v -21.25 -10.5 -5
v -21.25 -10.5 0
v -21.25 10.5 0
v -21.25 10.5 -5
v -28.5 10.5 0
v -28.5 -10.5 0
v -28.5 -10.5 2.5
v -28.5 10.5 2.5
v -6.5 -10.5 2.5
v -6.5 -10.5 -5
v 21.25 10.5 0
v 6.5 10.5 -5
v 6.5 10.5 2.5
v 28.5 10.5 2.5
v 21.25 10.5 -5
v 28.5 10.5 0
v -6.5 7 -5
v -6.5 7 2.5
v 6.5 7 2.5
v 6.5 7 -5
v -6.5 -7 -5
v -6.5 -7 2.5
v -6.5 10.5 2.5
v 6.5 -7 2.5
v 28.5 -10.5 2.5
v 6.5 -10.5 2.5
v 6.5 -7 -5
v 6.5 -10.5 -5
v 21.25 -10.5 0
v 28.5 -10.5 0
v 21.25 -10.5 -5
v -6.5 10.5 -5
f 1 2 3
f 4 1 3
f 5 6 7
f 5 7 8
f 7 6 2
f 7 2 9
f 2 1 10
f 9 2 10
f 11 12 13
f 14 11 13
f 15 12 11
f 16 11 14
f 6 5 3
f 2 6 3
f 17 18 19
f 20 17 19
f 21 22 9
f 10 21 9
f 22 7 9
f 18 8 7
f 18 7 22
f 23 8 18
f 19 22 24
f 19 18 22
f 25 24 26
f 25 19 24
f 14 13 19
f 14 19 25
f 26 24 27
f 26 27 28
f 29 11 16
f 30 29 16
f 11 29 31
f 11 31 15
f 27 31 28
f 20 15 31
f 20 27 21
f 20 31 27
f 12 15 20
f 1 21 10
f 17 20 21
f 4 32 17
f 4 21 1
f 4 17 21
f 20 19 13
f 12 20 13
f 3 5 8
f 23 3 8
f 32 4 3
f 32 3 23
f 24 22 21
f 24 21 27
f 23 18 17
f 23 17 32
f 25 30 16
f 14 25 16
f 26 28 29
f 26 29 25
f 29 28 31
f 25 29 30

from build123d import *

# Parameters (mm, degrees)
SKETCH1_W           = 57
SKETCH1_H           = 21
BOSS_EXTRUDE1_DEPTH = 2.5
SKETCH2_W           = 42.5
SKETCH2_H           = 21
BOSS_EXTRUDE2_DEPTH = 5
SKETCH3_W           = 13
SKETCH3_H           = 3.5
CUT_EXTRUDE1_DEPTH  = 8.5


with BuildPart() as part:
    # Sketch1 → Boss-Extrude1 (new body)
    with BuildSketch(Plane.XY):
        Rectangle(SKETCH1_W, SKETCH1_H)
    extrude(amount=BOSS_EXTRUDE1_DEPTH)

    # Sketch2 → Boss-Extrude2 (add)
    with BuildSketch(Plane(origin=(0, 0, 0), x_dir=(-1, 0, 0), z_dir=(0, 0, -1))):
        Rectangle(SKETCH2_W, SKETCH2_H)
    extrude(amount=BOSS_EXTRUDE2_DEPTH)

    # Sketch3 → Cut-Extrude1 (cut, through all)
    with BuildSketch(Plane.XY.offset(2.5)):
        with Locations((0, 8.75)):
            Rectangle(SKETCH3_W, SKETCH3_H)
    cut_extrude1 = extrude(amount=-CUT_EXTRUDE1_DEPTH, mode=Mode.SUBTRACT)

    # Mirror1: Cut-Extrude1 across plane
    add(cut_extrude1.mirror(Plane.ZX), mode=Mode.SUBTRACT)


solid = part.part
